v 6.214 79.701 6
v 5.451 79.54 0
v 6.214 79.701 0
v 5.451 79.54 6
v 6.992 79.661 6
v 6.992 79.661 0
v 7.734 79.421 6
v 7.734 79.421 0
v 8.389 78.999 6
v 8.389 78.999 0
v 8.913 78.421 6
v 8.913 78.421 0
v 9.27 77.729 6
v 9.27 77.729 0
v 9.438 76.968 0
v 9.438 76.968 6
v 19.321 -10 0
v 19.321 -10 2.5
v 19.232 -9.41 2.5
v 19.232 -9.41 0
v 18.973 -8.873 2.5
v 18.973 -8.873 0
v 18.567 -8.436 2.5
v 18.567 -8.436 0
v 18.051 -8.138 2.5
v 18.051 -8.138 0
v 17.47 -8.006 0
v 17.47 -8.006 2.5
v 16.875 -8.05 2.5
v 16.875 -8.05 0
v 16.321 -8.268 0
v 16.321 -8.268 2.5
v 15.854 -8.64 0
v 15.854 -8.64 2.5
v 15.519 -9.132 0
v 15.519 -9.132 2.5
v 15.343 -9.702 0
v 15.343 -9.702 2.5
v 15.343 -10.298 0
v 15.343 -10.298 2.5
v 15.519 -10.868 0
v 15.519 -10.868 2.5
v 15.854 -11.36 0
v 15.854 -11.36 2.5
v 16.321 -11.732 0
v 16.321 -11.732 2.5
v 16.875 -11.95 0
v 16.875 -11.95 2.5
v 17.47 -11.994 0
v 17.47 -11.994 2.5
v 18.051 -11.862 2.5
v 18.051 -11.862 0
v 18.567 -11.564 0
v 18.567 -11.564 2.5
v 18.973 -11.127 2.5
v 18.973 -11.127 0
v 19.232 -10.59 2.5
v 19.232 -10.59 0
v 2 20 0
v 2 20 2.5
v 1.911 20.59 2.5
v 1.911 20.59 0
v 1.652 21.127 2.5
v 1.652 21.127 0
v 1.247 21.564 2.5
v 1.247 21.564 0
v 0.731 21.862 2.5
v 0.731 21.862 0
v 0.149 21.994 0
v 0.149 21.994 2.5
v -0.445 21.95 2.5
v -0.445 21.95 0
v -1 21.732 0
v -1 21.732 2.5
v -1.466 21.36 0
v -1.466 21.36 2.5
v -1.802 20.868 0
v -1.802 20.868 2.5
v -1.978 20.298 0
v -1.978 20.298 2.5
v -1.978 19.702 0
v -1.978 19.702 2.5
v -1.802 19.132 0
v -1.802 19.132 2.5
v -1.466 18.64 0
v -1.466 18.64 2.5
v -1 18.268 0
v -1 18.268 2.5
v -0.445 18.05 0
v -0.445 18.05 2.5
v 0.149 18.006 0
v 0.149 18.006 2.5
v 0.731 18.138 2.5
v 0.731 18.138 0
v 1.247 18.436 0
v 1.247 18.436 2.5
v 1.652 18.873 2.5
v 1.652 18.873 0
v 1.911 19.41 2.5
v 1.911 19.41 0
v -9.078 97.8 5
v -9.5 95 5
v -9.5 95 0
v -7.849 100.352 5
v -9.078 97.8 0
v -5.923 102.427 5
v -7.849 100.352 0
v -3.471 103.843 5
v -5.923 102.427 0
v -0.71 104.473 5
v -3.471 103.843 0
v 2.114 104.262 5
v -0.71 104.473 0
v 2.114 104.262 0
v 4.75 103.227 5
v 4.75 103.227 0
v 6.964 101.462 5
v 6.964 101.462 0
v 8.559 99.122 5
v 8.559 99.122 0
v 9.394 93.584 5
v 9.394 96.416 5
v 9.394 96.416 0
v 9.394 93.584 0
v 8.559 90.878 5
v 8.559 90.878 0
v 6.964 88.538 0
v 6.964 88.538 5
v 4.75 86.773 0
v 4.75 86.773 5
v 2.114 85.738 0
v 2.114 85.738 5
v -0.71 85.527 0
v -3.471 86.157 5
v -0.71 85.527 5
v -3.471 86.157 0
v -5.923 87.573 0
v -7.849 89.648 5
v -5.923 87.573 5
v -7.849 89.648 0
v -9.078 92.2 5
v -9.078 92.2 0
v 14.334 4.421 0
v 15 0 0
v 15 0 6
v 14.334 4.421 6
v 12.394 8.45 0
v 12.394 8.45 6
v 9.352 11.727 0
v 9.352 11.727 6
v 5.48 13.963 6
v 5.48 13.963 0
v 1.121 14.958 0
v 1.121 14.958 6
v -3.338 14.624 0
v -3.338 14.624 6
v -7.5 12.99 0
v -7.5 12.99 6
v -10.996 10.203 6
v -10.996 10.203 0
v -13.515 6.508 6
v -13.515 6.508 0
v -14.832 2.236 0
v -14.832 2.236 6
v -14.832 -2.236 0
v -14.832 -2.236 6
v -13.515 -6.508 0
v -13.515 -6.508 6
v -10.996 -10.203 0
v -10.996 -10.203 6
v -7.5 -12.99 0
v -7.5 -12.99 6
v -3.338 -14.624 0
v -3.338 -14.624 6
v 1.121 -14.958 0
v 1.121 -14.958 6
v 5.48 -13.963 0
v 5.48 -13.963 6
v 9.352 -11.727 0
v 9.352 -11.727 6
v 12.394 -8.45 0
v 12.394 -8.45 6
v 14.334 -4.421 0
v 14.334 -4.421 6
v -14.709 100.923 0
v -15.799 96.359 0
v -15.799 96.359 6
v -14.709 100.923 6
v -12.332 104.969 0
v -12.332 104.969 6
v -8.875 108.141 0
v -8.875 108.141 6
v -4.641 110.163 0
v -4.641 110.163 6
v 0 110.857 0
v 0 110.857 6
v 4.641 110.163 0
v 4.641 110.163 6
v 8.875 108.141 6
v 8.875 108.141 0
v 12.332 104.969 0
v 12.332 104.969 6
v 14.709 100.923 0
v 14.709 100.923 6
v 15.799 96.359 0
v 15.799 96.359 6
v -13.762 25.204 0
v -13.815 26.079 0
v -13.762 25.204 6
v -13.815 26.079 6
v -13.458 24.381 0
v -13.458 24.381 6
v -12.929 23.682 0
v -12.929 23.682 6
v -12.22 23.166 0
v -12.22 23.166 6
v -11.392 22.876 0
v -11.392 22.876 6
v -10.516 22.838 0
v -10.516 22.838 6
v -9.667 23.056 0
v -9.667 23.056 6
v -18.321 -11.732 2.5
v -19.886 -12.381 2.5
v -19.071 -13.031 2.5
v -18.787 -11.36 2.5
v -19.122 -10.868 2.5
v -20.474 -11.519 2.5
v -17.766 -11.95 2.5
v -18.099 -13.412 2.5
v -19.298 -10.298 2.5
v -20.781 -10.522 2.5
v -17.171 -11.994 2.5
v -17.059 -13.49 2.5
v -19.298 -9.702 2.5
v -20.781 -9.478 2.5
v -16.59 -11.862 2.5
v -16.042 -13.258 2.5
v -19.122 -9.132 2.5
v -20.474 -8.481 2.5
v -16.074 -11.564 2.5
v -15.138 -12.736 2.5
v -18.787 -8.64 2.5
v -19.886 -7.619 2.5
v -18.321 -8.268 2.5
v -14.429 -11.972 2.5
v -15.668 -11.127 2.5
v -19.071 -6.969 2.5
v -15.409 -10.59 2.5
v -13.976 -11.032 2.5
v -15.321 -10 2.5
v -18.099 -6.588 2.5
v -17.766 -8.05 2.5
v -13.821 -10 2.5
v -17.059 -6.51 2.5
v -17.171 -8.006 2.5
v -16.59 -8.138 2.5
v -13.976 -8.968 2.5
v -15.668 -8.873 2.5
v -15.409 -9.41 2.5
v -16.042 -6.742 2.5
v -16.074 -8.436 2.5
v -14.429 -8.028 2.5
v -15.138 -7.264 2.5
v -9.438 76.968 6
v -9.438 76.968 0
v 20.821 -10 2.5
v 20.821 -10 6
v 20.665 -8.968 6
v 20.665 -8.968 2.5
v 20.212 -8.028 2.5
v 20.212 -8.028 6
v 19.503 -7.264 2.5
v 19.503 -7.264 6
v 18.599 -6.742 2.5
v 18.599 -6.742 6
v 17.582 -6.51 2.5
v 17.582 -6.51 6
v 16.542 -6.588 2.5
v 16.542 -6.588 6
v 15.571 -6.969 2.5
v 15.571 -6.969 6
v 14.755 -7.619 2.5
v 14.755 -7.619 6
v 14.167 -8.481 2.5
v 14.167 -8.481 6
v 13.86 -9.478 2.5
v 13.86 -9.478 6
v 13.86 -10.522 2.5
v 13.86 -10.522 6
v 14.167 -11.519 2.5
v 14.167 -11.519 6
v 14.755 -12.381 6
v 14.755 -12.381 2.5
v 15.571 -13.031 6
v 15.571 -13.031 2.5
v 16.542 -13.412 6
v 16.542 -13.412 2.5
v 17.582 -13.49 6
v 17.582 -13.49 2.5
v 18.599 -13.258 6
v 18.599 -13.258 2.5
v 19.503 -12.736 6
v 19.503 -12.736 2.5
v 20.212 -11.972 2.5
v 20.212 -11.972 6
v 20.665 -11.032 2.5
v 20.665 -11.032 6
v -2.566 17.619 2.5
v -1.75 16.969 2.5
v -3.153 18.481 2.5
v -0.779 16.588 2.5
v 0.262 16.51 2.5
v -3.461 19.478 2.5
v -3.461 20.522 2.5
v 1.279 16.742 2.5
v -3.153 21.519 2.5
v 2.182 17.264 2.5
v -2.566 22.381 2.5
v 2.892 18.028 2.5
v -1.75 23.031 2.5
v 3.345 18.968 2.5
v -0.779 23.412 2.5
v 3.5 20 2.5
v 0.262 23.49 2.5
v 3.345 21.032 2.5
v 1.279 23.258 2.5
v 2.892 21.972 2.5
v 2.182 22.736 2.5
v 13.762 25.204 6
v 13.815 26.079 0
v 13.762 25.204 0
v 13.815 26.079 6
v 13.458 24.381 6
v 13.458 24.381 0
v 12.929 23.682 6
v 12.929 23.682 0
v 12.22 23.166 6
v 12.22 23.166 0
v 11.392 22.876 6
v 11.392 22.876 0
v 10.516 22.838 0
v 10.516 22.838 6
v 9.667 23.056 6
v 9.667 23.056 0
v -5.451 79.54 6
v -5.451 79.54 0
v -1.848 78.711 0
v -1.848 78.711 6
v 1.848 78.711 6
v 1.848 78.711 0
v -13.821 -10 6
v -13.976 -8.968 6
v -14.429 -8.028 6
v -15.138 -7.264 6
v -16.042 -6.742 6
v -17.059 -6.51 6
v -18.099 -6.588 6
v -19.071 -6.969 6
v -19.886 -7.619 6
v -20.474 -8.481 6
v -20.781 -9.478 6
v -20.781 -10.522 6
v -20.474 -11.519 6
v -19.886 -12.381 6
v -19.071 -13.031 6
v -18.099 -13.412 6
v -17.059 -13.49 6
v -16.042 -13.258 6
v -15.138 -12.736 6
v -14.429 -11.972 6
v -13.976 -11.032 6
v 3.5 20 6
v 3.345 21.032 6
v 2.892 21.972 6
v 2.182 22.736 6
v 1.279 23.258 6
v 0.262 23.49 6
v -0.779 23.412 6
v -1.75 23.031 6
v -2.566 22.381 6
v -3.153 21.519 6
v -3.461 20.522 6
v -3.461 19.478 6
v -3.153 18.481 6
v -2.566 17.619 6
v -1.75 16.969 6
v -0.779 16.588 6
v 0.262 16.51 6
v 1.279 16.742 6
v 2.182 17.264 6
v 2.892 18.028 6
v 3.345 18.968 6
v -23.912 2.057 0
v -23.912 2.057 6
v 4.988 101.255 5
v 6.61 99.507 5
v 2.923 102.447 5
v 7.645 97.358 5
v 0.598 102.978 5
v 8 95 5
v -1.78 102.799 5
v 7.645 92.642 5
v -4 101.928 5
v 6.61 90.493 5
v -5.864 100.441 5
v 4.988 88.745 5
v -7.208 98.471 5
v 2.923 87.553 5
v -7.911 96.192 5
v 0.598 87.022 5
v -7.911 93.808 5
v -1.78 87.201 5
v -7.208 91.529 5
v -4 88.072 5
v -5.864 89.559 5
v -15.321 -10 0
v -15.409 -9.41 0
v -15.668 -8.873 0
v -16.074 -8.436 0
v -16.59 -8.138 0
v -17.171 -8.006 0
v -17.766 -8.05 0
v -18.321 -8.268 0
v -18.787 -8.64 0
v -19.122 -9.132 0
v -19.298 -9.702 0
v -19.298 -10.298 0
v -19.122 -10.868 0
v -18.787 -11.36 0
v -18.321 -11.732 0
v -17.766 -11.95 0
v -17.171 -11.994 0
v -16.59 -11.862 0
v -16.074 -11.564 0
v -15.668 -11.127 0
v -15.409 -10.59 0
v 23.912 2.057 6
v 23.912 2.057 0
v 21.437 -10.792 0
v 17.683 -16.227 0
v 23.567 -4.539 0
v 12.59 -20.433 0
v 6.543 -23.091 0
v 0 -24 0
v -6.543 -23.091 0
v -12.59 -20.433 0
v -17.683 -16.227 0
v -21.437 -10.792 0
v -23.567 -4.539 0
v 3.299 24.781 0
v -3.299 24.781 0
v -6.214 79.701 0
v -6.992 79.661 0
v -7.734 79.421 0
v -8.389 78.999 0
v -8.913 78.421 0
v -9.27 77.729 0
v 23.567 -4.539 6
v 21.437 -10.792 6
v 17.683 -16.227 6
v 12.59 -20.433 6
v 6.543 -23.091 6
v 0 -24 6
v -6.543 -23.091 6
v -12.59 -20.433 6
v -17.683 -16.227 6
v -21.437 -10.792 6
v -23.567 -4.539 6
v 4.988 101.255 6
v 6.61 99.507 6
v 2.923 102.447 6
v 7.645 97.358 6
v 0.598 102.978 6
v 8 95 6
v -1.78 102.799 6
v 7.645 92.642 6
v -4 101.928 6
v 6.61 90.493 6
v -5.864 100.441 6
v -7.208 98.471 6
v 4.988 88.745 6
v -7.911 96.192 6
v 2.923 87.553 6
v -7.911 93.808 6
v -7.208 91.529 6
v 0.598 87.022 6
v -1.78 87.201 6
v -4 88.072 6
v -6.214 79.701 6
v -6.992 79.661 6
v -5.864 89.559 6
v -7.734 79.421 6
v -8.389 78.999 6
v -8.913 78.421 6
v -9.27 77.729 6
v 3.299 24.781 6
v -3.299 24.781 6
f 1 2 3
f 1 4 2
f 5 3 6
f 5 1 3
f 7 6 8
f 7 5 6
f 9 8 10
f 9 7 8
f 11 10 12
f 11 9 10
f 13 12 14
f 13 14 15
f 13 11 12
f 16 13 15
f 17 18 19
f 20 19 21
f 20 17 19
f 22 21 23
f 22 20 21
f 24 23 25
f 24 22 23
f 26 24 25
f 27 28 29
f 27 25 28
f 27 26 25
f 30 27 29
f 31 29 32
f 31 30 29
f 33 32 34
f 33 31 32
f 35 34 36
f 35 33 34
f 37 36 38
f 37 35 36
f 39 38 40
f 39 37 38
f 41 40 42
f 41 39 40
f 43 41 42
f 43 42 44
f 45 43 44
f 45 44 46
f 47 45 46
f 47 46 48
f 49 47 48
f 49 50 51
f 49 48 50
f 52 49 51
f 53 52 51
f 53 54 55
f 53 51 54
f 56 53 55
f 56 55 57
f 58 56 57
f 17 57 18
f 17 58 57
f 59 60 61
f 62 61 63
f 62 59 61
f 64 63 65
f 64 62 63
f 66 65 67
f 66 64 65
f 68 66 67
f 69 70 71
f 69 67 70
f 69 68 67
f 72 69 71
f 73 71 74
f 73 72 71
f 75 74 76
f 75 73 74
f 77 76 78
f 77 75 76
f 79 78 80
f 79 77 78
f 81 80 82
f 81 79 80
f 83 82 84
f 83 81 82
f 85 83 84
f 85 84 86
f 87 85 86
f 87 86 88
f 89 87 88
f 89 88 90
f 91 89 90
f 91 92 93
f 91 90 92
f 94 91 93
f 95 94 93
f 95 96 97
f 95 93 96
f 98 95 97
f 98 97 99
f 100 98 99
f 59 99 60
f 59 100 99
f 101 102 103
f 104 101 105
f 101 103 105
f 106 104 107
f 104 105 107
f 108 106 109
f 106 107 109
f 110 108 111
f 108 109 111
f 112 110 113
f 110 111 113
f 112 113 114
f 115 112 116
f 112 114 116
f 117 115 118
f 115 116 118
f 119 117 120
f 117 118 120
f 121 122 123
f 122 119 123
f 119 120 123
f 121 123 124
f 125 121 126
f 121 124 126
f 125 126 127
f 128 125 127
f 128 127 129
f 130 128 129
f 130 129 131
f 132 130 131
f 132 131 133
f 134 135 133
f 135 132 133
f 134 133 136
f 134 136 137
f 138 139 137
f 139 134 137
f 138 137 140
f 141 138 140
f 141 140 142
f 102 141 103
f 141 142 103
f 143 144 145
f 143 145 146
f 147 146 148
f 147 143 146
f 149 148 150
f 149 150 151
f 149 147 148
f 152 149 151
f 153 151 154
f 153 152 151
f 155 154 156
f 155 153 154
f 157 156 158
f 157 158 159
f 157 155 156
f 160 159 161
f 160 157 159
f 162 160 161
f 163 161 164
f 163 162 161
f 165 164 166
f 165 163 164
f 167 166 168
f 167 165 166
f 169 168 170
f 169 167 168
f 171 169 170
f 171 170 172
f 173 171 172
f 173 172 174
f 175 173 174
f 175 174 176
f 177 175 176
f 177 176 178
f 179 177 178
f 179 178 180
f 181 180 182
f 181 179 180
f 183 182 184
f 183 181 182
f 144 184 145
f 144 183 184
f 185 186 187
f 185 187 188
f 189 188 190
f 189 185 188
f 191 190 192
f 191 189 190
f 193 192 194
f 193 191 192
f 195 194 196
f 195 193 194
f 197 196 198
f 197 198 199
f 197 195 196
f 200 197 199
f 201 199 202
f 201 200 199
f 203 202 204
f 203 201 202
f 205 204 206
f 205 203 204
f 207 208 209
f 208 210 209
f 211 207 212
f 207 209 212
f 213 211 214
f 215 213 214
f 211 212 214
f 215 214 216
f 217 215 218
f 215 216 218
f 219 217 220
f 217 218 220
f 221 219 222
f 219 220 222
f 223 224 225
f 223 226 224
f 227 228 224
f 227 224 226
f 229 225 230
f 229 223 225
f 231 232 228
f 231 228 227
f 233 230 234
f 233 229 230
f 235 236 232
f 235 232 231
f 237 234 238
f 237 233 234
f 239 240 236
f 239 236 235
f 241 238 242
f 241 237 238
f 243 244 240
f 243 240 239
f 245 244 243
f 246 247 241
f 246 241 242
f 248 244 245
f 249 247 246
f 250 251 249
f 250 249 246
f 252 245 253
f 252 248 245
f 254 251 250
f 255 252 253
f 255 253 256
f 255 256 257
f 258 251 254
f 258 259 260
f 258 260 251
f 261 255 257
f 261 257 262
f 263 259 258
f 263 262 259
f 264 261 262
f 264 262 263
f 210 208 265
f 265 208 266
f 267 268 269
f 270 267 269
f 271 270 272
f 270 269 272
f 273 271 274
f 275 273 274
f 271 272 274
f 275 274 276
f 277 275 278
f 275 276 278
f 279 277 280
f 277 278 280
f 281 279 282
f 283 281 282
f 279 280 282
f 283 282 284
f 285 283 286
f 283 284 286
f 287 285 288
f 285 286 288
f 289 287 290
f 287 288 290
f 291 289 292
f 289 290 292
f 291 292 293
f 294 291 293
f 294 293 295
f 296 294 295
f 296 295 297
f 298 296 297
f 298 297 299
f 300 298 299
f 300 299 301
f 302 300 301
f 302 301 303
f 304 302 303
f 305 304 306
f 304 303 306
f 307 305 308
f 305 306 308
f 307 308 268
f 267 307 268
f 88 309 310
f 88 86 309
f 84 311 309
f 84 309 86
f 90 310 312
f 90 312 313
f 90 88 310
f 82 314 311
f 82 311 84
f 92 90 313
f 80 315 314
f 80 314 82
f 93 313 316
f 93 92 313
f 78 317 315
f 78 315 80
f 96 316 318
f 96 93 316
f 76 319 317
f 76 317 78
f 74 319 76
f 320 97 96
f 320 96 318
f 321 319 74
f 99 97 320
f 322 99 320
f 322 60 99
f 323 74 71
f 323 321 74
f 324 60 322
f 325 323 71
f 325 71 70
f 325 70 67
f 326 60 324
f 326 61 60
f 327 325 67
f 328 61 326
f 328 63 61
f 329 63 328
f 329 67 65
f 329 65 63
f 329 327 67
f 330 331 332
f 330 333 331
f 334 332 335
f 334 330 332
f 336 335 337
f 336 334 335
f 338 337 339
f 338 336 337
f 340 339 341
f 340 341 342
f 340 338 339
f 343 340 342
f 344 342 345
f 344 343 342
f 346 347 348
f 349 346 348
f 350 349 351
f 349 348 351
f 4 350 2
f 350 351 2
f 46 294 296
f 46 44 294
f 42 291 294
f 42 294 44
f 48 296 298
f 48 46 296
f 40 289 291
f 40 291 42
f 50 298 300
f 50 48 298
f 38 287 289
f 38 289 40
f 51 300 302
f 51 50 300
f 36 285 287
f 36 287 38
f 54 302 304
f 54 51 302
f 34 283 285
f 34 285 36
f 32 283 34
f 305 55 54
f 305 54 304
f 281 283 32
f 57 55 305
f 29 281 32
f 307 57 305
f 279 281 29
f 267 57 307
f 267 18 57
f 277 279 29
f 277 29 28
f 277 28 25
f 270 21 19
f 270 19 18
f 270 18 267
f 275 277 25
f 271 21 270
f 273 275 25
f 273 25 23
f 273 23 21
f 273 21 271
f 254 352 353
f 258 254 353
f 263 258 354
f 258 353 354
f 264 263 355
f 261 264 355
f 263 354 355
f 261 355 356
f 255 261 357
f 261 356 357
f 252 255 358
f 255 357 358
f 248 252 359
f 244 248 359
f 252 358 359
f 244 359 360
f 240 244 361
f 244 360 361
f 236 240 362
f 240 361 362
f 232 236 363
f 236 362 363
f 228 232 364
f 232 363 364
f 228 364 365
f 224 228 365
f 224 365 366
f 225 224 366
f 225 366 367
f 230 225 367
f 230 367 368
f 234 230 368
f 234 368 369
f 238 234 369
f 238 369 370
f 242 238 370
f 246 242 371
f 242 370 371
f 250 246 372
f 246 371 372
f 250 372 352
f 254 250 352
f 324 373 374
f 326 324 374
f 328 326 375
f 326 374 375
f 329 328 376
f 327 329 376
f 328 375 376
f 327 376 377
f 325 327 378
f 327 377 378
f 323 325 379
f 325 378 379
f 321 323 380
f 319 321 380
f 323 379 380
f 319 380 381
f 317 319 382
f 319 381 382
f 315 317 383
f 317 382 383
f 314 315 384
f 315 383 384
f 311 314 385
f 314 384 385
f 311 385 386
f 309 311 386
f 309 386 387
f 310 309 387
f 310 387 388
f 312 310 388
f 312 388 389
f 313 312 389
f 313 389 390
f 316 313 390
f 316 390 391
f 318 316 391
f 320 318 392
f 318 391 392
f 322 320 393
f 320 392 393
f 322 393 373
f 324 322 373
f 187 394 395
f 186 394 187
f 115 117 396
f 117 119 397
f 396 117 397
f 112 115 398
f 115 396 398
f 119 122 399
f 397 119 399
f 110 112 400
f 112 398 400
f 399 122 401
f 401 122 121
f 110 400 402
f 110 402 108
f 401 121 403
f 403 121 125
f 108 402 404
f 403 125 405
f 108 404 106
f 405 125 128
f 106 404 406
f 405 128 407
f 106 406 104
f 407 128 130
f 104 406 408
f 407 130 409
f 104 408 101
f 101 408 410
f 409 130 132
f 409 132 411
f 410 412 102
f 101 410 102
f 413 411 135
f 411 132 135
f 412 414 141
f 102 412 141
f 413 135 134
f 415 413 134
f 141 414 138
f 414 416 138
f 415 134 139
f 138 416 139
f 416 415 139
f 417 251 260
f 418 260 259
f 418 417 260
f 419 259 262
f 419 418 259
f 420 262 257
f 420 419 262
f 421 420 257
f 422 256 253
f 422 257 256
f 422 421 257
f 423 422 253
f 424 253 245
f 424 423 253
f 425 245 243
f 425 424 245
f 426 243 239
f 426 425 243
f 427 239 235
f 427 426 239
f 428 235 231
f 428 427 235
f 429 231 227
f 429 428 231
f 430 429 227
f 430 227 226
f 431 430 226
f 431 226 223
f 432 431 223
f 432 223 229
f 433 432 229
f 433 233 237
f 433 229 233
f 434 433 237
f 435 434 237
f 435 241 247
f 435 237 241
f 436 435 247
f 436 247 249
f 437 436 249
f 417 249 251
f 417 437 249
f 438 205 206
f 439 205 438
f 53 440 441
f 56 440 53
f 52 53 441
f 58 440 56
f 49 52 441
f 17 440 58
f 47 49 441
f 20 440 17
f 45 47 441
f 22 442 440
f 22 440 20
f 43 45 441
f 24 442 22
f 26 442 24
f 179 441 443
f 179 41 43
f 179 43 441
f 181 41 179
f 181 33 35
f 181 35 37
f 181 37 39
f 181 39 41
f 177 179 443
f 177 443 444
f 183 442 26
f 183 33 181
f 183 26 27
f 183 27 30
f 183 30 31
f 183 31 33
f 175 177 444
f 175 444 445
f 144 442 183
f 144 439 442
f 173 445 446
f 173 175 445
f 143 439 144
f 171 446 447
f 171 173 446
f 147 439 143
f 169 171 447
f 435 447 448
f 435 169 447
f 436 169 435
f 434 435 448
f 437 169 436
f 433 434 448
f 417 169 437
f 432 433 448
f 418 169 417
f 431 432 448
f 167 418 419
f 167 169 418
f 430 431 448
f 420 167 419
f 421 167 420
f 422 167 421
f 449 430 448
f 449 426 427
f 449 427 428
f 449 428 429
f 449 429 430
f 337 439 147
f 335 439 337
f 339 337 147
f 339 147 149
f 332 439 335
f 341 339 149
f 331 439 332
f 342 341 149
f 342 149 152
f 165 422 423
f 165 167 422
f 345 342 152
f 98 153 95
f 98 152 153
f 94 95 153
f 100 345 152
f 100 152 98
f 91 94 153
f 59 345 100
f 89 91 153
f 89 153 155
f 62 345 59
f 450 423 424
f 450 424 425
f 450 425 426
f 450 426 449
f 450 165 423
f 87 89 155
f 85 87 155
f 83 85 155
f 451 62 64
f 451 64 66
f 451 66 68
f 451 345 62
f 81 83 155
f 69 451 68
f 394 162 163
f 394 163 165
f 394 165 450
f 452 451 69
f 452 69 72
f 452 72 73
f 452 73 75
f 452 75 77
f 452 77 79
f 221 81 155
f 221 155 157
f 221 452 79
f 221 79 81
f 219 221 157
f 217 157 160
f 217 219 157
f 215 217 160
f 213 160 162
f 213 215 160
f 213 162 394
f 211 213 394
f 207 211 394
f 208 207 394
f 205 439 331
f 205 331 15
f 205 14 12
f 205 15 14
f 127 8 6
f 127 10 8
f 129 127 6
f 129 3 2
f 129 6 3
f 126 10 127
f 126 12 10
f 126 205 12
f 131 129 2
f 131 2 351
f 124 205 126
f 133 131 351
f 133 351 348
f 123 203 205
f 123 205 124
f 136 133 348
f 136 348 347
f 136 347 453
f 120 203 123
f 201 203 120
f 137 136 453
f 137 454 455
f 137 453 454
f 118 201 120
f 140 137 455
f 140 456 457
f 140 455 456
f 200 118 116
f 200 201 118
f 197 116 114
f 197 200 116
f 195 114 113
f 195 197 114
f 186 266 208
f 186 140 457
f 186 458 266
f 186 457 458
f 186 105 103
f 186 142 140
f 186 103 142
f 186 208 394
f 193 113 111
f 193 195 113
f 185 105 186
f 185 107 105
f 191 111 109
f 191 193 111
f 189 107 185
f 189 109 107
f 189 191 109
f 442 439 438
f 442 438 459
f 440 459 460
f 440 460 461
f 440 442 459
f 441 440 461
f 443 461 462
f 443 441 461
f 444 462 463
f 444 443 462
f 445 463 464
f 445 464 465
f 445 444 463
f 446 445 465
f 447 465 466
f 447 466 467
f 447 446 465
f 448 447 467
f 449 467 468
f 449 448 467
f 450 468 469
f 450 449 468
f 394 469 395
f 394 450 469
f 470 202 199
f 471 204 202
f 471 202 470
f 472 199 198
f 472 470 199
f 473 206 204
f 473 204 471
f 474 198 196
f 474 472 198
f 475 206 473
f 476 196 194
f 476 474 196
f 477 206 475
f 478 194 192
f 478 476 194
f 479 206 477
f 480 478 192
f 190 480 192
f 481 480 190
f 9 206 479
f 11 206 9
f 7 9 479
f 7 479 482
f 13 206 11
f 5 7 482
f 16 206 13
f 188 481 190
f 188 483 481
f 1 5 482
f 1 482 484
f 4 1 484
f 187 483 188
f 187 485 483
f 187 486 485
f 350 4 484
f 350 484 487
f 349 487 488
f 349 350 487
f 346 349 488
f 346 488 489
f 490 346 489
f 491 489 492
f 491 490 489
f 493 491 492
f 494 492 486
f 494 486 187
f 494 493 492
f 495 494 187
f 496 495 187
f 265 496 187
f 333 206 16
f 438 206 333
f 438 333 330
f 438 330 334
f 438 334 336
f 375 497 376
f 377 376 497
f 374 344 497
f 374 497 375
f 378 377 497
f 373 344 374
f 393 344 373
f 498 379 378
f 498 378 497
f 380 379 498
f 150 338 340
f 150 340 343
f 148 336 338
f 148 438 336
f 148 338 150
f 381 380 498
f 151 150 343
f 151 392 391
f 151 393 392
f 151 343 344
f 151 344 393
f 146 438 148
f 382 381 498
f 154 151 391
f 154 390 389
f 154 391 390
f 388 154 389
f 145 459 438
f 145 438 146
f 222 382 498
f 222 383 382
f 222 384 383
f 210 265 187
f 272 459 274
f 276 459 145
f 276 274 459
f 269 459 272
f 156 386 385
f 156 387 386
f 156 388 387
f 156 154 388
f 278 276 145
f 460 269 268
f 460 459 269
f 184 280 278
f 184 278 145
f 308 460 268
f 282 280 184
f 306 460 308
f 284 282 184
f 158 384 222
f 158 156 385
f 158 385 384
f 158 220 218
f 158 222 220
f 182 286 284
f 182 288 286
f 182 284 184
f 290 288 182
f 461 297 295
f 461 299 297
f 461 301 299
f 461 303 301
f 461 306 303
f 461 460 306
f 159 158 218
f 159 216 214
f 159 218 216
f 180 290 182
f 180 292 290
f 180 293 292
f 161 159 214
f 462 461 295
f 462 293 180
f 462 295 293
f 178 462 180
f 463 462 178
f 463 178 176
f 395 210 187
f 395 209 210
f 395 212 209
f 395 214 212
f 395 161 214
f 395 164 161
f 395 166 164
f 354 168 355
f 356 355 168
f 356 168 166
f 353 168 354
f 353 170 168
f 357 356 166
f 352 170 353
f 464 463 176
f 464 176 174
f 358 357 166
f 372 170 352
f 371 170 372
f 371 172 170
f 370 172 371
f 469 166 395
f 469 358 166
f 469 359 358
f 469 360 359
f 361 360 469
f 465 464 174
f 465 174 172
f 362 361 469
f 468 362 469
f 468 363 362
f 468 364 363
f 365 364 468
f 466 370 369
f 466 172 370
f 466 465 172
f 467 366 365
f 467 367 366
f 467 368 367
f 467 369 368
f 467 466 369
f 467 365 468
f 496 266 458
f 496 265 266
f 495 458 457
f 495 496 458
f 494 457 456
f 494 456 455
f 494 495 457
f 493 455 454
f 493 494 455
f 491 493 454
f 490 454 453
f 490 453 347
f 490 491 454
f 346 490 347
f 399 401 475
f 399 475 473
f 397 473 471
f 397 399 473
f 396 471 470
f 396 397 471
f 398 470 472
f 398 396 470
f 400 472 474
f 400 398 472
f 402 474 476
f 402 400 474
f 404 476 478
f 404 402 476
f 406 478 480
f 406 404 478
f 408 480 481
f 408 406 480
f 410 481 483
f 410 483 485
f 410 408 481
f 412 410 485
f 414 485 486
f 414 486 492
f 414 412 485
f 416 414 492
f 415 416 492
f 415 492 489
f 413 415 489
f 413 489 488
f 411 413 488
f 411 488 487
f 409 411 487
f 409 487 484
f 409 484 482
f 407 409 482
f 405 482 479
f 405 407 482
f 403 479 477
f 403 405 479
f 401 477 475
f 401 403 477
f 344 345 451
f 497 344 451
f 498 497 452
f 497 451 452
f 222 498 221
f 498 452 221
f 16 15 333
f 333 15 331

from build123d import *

# Parameters (mm, degrees)
SKETCH_1_R          = 15
SKETCH_1_R_2        = 2
EXTRUDE_1_DEPTH     = 6
FILLET_1_R          = 3
SKETCH_3_R          = 9.5
CUT_EXTRUDE_2_DEPTH = 6
SKETCH_4_R          = 3.5
CUT_EXTRUDE_3_DEPTH = 3.5
EXTRUDE_START       = -1
SKETCH_6_R          = 9.5
SKETCH_6_R_2        = 8
EXTRUDE_3_DEPTH     = 1


with BuildPart() as part:
    # 草图1 → 凸台-拉伸1 (new body)
    with BuildSketch(Plane.XY):
        with BuildLine():
            Line((-23.911674205, 2.057142857), (-15.798784742, 96.359183673))
            ThreePointArc((-15.798784742, 96.359183673), (0, 110.857142857), (15.798784742, 96.359183673))
            Line((15.798784742, 96.359183673), (23.911674205, 2.057142857))
            ThreePointArc((23.911674205, 2.057142857), (0, -24), (-23.911674205, 2.057142857))
        make_face()
        Circle(SKETCH_1_R, mode=Mode.SUBTRACT)
        with Locations((0, 20)):
            Circle(SKETCH_1_R_2, mode=Mode.SUBTRACT)
        with Locations((17.320508076, -10)):
            Circle(SKETCH_1_R_2, mode=Mode.SUBTRACT)
        with Locations((-17.320508076, -10)):
            Circle(SKETCH_1_R_2, mode=Mode.SUBTRACT)
        with BuildLine():
            Line((-14.294598475, 20.510106154), (-9.061440494, 81.338924272))
            ThreePointArc((-9.061440494, 81.338924272), (0, 78.606870528), (9.061440494, 81.338924272))
            Line((9.061440494, 81.338924272), (14.294598475, 20.510106154))
            ThreePointArc((14.294598475, 20.510106154), (0, 25), (-14.294598475, 20.510106154))
        make_face(mode=Mode.SUBTRACT)
    extrude(amount=EXTRUDE_1_DEPTH)

    # 圆角1
    fillet_1_edges = [part.edges().sort_by_distance(p)[0] for p in [
        (-14.294598475, 20.510106154, 3),
        (14.294598475, 20.510106154, 3),
        (9.061440494, 81.338924272, 3),
        (-9.061440494, 81.338924272, 3),
    ]]
    fillet(fillet_1_edges, radius=FILLET_1_R)

    # 草图3 → 切除-拉伸2 (cut)
    with BuildSketch(Plane(origin=(0, 0, 0), x_dir=(-1, 0, 0), z_dir=(0, 0, -1))):
        with Locations((0, 95)):
            Circle(SKETCH_3_R)
    extrude(amount=-CUT_EXTRUDE_2_DEPTH, mode=Mode.SUBTRACT)

    # 草图4 → 切除-拉伸3 (cut)
    with BuildSketch(Plane.XY.offset(6)):
        with Locations((0, 20)):
            Circle(SKETCH_4_R)
        with Locations((17.320508076, -10)):
            Circle(SKETCH_4_R)
        with Locations((-17.320508076, -10)):
            Circle(SKETCH_4_R)
    extrude(amount=-CUT_EXTRUDE_3_DEPTH, mode=Mode.SUBTRACT)

    # 草图6 → 凸台-拉伸3 (add)
    with BuildSketch(Plane.XY.offset(6).offset(EXTRUDE_START)):
        with Locations(Location((0, 95, 0), (0, 0, 180))):
            Circle(SKETCH_6_R)
        with Locations((0, 95)):
            Circle(SKETCH_6_R_2, mode=Mode.SUBTRACT)
    extrude(amount=EXTRUDE_3_DEPTH)


solid = part.part
